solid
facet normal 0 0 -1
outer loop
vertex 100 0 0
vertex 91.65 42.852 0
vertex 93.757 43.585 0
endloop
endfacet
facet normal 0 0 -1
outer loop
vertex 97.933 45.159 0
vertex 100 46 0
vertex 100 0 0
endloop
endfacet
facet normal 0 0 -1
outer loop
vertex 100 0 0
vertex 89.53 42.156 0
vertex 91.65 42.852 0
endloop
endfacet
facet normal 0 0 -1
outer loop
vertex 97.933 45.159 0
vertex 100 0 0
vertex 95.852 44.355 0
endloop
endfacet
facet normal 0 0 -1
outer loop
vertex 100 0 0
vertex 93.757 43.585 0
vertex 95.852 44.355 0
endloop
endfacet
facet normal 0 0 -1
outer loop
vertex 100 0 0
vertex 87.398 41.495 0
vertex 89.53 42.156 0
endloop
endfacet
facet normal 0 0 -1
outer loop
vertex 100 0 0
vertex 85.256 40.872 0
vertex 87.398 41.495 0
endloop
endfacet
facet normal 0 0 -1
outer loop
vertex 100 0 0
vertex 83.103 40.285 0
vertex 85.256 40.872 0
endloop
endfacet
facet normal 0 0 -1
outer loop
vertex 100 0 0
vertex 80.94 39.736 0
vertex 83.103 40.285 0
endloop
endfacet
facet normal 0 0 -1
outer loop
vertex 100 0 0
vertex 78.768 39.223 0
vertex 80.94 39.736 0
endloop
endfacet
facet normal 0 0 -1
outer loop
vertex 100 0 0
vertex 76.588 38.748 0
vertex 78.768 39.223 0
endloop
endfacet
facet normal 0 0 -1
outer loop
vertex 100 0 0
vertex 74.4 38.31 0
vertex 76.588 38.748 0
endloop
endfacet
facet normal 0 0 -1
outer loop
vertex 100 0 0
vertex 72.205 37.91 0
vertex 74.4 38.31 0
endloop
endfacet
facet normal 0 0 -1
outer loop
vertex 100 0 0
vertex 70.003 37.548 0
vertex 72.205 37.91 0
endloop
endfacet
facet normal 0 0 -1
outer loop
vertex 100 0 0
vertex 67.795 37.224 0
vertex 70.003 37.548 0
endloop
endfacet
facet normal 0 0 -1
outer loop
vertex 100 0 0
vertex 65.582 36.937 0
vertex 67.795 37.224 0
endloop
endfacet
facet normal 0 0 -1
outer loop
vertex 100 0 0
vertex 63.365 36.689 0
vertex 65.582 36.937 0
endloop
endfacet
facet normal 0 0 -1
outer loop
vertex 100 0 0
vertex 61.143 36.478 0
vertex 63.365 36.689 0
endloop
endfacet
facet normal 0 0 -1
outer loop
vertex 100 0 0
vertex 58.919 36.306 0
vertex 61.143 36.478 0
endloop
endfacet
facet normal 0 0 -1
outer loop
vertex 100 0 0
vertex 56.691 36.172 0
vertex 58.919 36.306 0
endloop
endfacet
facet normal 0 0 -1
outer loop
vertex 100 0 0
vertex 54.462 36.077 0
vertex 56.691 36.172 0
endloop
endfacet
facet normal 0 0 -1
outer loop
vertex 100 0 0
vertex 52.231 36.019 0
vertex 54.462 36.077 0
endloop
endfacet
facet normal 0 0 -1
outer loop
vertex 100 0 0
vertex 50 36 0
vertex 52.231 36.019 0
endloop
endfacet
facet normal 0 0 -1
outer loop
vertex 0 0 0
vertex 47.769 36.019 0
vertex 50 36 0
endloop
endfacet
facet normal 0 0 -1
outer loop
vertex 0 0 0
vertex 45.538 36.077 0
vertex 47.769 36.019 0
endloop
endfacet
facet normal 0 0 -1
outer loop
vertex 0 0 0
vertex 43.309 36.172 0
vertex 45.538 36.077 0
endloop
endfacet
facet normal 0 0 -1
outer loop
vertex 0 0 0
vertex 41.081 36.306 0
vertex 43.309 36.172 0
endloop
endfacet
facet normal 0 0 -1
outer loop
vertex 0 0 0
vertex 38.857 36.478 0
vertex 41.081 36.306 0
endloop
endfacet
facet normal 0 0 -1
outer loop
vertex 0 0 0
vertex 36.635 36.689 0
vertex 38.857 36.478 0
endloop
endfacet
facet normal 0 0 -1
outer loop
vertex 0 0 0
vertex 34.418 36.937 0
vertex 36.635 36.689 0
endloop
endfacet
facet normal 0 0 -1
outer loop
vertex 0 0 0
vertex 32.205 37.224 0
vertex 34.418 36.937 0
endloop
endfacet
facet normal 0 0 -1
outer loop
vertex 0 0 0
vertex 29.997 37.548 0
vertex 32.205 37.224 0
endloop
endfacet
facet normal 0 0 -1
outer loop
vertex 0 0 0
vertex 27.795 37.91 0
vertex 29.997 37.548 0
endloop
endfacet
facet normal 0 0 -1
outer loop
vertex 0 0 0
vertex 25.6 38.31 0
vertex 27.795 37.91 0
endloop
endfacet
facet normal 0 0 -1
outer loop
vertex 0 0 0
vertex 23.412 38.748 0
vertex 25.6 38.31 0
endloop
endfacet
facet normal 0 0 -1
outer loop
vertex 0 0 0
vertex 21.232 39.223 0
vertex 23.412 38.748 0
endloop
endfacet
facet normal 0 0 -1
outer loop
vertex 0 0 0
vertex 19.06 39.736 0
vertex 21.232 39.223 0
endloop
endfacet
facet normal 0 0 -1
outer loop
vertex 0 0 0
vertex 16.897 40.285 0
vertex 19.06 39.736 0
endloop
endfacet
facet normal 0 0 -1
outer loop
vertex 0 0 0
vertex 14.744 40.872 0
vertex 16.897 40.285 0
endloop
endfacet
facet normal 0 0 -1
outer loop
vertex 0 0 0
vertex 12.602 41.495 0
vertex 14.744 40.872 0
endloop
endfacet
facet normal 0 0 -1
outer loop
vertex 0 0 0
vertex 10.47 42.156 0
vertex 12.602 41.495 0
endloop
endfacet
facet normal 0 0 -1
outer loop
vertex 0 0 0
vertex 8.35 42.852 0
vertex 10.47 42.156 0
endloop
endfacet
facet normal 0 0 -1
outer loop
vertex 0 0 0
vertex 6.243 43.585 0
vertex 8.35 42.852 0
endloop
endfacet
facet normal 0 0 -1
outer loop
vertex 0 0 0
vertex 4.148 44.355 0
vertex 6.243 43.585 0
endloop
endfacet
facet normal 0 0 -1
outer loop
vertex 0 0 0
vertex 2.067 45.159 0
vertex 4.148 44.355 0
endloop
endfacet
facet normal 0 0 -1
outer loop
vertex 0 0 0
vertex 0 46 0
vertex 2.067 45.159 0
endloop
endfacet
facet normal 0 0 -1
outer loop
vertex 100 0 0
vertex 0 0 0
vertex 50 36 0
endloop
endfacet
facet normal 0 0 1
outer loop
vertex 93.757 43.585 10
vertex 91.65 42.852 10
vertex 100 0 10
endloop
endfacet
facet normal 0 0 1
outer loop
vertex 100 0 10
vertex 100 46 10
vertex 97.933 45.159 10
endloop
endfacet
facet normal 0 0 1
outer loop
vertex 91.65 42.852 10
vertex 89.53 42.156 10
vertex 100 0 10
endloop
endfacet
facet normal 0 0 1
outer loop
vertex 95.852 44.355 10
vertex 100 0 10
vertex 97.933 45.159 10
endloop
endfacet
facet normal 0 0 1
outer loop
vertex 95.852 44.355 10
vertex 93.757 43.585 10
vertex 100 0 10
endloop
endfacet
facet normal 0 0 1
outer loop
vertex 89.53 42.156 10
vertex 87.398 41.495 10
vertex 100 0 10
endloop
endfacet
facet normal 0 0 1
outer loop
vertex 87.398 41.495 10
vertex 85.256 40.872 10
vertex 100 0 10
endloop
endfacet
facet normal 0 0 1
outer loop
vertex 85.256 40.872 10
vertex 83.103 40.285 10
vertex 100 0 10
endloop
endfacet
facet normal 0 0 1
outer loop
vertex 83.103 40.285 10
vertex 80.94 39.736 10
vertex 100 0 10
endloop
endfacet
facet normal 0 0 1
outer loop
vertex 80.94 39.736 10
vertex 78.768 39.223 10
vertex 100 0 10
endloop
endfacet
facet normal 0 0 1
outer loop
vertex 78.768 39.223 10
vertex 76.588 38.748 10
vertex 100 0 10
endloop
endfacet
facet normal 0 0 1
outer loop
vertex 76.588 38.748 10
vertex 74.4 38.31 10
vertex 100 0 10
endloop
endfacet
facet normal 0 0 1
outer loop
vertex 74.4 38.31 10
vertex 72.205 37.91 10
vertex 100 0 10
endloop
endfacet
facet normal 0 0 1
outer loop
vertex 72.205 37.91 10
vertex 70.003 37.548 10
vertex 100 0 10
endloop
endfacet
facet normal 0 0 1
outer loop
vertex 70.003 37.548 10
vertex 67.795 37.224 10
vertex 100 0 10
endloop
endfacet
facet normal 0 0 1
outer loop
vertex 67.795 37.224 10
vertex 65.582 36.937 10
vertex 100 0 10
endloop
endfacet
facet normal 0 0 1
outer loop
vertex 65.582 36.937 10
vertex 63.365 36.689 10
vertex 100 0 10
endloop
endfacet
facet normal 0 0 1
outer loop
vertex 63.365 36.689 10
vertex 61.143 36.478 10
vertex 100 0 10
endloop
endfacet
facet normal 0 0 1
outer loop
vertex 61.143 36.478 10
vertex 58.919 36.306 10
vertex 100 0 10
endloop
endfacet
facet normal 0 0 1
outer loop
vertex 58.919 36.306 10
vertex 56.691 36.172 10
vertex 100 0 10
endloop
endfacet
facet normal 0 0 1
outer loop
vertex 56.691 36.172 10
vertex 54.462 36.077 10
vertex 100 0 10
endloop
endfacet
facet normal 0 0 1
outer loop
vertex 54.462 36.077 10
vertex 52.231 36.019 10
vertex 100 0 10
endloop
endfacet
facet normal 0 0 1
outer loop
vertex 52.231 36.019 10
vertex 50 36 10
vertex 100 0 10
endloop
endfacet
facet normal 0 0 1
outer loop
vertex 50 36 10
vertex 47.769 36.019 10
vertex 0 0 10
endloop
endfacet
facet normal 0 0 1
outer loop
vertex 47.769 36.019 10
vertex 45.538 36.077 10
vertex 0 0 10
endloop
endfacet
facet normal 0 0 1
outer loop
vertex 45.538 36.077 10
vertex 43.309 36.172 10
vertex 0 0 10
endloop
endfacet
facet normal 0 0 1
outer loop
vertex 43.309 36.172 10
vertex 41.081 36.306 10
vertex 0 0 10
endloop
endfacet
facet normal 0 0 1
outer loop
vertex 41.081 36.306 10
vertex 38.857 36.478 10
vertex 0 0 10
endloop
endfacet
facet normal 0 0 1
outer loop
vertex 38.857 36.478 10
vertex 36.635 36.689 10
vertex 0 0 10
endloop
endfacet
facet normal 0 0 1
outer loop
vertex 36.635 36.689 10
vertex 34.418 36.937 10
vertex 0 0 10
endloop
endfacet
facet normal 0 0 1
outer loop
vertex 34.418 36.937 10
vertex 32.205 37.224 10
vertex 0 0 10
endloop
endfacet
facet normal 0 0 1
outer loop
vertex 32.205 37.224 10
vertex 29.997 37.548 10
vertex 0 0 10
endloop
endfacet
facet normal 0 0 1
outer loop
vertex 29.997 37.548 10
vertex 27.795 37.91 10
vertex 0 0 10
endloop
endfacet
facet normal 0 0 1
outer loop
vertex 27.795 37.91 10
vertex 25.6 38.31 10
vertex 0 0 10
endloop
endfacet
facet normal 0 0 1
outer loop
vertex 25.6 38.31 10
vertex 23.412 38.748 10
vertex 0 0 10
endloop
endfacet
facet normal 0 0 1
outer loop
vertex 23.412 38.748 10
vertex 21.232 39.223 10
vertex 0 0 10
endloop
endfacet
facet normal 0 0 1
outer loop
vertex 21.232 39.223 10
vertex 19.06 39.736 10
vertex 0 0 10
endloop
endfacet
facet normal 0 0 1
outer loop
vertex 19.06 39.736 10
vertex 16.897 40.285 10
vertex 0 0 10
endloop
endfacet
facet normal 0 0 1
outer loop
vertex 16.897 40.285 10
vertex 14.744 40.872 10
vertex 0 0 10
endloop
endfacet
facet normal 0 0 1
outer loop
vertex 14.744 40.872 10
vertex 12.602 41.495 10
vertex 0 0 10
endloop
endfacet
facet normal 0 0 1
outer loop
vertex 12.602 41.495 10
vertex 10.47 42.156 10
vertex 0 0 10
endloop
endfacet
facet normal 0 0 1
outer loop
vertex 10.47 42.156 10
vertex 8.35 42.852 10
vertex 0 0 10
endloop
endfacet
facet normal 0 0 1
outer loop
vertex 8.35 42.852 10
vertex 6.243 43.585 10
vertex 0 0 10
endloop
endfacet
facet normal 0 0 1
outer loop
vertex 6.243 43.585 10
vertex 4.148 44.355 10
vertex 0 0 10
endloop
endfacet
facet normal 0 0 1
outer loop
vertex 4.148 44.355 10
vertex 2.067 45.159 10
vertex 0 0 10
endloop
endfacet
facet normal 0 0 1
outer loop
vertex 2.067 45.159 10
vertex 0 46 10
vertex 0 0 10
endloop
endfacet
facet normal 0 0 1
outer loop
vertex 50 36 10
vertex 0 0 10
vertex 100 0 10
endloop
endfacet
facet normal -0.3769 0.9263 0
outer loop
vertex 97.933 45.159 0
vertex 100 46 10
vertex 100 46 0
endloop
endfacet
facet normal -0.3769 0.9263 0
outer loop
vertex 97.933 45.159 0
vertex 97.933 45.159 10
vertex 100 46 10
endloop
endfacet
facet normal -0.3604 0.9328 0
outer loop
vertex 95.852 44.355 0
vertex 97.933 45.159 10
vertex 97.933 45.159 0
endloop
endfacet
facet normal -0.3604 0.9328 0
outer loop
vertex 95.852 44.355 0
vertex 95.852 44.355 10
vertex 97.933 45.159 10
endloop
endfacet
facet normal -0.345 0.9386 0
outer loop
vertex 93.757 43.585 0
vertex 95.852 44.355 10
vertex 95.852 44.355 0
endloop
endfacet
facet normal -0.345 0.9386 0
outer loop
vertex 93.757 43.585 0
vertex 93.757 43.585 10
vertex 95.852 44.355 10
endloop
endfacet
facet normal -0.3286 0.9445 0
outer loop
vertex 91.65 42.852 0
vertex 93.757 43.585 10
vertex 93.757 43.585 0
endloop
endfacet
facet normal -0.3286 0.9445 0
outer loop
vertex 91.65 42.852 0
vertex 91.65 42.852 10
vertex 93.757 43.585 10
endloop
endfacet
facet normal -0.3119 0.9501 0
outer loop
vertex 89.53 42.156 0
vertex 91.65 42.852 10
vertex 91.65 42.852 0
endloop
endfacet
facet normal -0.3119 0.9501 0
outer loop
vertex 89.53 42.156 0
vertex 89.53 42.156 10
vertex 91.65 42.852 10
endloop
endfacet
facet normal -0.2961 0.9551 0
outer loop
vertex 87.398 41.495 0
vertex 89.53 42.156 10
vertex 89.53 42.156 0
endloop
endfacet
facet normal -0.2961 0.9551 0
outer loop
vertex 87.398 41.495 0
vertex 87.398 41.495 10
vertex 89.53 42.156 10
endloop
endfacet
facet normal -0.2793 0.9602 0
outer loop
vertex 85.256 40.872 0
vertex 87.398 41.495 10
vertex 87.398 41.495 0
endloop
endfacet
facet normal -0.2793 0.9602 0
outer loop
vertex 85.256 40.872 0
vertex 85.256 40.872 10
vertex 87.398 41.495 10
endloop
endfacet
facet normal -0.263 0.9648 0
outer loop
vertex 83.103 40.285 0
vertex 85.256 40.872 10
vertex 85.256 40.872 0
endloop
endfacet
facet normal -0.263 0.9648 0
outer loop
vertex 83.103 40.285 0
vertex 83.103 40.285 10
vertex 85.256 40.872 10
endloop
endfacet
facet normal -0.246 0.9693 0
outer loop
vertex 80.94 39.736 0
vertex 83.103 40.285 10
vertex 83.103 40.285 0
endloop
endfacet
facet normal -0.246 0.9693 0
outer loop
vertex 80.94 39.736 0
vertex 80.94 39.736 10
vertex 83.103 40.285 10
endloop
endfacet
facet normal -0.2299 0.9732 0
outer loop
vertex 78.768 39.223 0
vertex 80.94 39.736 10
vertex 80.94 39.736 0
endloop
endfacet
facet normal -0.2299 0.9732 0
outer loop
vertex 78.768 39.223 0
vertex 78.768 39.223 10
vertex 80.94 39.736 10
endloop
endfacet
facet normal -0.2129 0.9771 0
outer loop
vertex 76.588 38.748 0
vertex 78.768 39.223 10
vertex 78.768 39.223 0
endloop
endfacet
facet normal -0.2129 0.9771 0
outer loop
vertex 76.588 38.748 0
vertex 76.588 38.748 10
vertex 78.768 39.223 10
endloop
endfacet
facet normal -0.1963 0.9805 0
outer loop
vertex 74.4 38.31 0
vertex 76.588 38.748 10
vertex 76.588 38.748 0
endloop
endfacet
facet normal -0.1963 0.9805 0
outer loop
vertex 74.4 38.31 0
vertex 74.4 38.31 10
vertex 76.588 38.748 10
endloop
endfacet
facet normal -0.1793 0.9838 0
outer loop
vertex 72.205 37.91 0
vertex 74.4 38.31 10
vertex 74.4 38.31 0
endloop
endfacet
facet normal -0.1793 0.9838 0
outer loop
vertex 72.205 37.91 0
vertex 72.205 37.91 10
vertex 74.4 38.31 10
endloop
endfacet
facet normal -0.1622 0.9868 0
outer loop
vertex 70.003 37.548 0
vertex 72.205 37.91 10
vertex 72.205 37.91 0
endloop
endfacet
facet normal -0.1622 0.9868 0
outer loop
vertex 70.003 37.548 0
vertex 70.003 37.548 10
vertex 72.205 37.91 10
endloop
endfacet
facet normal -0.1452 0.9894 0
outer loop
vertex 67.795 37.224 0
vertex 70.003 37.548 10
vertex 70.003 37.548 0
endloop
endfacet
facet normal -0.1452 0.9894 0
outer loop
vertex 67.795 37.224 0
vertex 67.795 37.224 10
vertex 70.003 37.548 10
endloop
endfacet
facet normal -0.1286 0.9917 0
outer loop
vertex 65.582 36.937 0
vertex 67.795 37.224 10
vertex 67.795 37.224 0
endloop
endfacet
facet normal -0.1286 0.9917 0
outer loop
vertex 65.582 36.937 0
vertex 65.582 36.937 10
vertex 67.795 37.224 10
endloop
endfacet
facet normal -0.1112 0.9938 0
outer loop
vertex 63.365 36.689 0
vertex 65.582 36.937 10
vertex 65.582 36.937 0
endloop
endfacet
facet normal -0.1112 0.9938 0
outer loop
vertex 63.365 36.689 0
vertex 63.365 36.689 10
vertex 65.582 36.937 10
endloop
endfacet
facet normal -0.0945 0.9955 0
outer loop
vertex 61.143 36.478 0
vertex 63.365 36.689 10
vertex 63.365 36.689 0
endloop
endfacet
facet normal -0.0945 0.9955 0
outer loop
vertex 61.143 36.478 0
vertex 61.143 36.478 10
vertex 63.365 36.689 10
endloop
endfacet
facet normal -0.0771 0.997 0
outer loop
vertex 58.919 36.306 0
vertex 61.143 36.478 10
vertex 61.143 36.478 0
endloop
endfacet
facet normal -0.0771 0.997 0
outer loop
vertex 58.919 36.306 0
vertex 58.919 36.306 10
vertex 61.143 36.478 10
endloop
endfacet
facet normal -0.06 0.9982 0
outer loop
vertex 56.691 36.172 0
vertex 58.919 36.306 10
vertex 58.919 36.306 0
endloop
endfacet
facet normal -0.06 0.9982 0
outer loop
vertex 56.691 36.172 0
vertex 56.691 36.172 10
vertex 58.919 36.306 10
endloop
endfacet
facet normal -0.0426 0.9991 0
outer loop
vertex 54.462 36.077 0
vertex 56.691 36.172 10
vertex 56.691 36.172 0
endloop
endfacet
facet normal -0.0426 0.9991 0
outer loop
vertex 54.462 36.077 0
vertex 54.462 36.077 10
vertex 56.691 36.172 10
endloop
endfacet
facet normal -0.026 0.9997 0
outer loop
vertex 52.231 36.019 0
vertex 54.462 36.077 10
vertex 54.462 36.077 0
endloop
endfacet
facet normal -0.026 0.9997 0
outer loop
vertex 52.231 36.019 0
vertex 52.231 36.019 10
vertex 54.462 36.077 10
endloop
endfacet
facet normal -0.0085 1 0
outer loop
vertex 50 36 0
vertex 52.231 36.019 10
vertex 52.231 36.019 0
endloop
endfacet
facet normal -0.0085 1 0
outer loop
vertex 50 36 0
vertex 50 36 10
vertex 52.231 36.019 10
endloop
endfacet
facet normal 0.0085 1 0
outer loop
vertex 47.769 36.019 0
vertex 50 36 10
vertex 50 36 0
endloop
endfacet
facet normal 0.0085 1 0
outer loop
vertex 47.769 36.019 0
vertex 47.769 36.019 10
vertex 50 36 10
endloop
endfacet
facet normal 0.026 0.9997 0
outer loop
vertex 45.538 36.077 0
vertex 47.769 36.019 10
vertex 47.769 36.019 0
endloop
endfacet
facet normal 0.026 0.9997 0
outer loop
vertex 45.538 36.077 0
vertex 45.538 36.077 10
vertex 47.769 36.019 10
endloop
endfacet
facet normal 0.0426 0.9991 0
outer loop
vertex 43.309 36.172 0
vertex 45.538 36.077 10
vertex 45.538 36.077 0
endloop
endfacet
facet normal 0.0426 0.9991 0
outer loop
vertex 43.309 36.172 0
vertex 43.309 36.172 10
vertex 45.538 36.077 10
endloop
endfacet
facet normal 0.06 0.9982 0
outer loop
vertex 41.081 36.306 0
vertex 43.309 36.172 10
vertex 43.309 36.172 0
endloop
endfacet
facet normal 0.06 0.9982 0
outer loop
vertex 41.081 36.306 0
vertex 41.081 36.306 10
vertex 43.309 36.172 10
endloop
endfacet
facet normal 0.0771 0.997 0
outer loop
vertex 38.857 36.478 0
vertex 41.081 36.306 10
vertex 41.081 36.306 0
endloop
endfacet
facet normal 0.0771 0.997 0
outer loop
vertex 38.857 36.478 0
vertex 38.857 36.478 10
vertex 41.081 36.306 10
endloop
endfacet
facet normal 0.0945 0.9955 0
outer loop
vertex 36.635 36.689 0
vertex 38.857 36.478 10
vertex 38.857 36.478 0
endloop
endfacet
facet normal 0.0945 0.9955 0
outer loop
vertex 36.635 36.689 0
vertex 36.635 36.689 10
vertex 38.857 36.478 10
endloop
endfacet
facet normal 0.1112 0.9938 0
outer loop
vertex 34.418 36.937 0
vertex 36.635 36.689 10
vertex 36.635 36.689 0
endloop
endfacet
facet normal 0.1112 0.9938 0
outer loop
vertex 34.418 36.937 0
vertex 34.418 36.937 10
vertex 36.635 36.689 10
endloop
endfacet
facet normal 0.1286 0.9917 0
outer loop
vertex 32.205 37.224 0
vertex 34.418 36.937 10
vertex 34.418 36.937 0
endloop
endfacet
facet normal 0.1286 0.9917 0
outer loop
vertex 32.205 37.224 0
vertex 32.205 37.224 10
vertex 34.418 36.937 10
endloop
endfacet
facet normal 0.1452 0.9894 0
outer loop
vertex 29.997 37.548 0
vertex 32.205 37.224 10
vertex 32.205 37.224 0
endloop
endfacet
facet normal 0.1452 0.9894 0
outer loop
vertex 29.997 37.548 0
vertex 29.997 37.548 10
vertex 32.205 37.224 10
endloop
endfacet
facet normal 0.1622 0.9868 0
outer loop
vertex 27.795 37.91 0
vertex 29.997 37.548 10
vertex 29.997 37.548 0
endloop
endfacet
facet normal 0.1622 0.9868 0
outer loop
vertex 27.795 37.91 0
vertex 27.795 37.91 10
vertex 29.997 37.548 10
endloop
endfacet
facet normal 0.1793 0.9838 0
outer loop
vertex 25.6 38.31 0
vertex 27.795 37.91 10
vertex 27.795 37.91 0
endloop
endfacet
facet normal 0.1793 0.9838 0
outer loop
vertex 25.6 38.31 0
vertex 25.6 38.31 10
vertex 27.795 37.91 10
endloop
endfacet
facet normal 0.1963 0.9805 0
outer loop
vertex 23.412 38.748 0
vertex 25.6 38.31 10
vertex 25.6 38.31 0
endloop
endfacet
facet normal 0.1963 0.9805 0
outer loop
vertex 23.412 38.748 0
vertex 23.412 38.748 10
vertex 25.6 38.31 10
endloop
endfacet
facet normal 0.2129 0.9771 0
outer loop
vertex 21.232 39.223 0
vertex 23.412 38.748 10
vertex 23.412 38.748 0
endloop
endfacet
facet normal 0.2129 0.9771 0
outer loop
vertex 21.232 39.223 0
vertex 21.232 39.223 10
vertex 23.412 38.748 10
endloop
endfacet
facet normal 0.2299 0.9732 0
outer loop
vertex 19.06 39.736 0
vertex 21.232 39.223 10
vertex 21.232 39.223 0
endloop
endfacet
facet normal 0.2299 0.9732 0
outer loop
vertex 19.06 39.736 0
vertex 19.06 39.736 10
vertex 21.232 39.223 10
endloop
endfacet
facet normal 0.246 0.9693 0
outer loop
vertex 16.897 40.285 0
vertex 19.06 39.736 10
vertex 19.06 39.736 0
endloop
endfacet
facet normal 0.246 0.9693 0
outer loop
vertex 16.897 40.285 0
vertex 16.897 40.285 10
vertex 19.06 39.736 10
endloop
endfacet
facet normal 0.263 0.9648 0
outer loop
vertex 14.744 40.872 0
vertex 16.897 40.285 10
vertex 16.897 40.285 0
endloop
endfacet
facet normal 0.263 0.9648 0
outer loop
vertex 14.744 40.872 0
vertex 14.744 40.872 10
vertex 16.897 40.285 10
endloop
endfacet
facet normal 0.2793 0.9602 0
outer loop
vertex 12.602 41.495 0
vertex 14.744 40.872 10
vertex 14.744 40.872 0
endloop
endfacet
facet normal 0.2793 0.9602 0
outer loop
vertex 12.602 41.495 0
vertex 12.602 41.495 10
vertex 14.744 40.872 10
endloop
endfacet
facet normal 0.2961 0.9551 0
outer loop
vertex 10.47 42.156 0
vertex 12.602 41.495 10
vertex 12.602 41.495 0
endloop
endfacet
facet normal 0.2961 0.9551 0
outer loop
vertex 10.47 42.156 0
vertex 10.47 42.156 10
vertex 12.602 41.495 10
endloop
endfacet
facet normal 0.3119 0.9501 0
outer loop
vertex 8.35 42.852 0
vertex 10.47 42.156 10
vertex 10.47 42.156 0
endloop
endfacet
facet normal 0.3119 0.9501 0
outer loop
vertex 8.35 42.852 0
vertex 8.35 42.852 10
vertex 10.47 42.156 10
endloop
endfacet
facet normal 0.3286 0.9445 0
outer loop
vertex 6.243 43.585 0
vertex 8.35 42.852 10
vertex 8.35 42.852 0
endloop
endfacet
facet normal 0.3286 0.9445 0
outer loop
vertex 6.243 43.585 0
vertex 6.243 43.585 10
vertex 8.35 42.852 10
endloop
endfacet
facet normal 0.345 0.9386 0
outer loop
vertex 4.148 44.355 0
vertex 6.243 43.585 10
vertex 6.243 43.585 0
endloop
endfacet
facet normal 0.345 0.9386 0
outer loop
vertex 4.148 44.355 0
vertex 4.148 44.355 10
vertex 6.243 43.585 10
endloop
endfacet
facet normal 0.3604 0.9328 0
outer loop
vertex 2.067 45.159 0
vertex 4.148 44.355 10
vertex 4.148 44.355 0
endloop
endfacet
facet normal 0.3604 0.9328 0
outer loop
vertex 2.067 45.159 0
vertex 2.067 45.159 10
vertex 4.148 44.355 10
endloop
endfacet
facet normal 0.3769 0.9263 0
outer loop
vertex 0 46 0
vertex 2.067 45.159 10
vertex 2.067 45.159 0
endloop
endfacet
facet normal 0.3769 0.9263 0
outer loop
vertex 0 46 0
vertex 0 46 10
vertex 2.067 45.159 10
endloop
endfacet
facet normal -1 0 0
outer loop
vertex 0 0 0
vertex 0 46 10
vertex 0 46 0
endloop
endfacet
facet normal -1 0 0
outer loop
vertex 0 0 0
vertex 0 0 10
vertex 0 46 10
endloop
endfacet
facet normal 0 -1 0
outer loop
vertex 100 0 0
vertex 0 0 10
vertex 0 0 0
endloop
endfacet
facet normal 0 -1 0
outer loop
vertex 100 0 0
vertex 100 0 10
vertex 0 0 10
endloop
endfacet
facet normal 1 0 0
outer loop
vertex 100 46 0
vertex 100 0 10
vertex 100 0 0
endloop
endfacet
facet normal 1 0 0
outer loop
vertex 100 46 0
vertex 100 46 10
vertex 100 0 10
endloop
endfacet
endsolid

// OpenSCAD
$fn = 32;

// ----------------------------------------------------------------------
// Arc profile plate: notch, 49 points
// ----------------------------------------------------------------------

// --- parameters (mm) ---
bar_l = 100;              // bar length, X
bar_w = 46;               // bar width, Y
notch_depth = 10;         // depth of the arc notch at mid-span
arc_r = 130;              // radius of the notch arc
arc_angle = 45.24;        // notch arc angle, degrees
arc_step = 1;             // sampling step of the notch arc, degrees
plate_t = 10;             // plate thickness, Z
fit_tol = 0.05;           // declared fit tolerance (prompt contract)
free_tol = 0.2;           // declared free tolerance (prompt contract)

profile = [[0, 0], [100, 0], [100, 46], [97.933, 45.159], [95.852, 44.355], [93.757, 43.585], [91.65, 42.852], [89.53, 42.156], [87.398, 41.495], [85.256, 40.872], [83.103, 40.285], [80.94, 39.736], [78.768, 39.223], [76.588, 38.748], [74.4, 38.31], [72.205, 37.91], [70.003, 37.548], [67.795, 37.224], [65.582, 36.937], [63.365, 36.689], [61.143, 36.478], [58.919, 36.306], [56.691, 36.172], [54.462, 36.077], [52.231, 36.019], [50, 36], [47.769, 36.019], [45.538, 36.077], [43.309, 36.172], [41.081, 36.306], [38.857, 36.478], [36.635, 36.689], [34.418, 36.937], [32.205, 37.224], [29.997, 37.548], [27.795, 37.91], [25.6, 38.31], [23.412, 38.748], [21.232, 39.223], [19.06, 39.736], [16.897, 40.285], [14.744, 40.872], [12.602, 41.495], [10.47, 42.156], [8.35, 42.852], [6.243, 43.585], [4.148, 44.355], [2.067, 45.159], [0, 46]];  // primary outline, 49 points, counter clockwise

// --- the one profile operation ---
linear_extrude(height = plate_t) polygon(points = profile);
